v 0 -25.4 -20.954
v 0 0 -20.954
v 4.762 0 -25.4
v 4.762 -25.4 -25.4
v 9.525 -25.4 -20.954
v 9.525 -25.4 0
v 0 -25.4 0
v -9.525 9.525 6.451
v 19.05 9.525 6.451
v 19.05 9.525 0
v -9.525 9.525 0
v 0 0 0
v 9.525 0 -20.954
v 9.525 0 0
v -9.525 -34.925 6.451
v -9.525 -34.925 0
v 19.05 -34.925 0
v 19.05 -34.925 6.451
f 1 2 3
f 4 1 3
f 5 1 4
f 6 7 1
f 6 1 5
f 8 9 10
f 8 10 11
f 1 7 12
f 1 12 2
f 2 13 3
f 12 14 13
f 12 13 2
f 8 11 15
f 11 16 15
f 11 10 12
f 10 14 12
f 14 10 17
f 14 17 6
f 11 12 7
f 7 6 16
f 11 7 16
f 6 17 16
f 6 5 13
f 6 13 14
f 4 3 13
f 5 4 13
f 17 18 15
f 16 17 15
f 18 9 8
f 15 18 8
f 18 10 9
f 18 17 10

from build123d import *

# Parameters (mm, degrees)
F1_DEPTH = 25.4
F3_DEPTH = 34.925
F4_W     = 28.575
F4_H     = 6.45089
F5_DEPTH = 9.525


with BuildPart() as f1:
    # F0 (on Front) → F1 (new body)
    with BuildSketch(Plane.XZ):
        Polygon((9.525, 0), (0, 0), (0, -20.954376), (4.7625, -25.4), (9.525, -20.954376), align=None)
    extrude(amount=F1_DEPTH)

    # F2 (on face) → F3 (join)
    with BuildSketch(Plane(origin=(0, 0, 0), x_dir=(-1, 0, 0), z_dir=(0, 1, 0))):
        Polygon((-19.05, 6.45089), (-19.05, 0), (-9.525, 0), (0, 0), (9.525, 0), (9.525, 6.45089), align=None)
    extrude(amount=-F3_DEPTH)

    # F4 (on face) → F5 (join)
    with BuildSketch(Plane(origin=(0, 0, 0), x_dir=(-1, 0, 0), z_dir=(0, 1, 0))):
        with Locations((-4.7625, 3.225445)):
            Rectangle(F4_W, F4_H)
    extrude(amount=F5_DEPTH)


solid = f1.part
